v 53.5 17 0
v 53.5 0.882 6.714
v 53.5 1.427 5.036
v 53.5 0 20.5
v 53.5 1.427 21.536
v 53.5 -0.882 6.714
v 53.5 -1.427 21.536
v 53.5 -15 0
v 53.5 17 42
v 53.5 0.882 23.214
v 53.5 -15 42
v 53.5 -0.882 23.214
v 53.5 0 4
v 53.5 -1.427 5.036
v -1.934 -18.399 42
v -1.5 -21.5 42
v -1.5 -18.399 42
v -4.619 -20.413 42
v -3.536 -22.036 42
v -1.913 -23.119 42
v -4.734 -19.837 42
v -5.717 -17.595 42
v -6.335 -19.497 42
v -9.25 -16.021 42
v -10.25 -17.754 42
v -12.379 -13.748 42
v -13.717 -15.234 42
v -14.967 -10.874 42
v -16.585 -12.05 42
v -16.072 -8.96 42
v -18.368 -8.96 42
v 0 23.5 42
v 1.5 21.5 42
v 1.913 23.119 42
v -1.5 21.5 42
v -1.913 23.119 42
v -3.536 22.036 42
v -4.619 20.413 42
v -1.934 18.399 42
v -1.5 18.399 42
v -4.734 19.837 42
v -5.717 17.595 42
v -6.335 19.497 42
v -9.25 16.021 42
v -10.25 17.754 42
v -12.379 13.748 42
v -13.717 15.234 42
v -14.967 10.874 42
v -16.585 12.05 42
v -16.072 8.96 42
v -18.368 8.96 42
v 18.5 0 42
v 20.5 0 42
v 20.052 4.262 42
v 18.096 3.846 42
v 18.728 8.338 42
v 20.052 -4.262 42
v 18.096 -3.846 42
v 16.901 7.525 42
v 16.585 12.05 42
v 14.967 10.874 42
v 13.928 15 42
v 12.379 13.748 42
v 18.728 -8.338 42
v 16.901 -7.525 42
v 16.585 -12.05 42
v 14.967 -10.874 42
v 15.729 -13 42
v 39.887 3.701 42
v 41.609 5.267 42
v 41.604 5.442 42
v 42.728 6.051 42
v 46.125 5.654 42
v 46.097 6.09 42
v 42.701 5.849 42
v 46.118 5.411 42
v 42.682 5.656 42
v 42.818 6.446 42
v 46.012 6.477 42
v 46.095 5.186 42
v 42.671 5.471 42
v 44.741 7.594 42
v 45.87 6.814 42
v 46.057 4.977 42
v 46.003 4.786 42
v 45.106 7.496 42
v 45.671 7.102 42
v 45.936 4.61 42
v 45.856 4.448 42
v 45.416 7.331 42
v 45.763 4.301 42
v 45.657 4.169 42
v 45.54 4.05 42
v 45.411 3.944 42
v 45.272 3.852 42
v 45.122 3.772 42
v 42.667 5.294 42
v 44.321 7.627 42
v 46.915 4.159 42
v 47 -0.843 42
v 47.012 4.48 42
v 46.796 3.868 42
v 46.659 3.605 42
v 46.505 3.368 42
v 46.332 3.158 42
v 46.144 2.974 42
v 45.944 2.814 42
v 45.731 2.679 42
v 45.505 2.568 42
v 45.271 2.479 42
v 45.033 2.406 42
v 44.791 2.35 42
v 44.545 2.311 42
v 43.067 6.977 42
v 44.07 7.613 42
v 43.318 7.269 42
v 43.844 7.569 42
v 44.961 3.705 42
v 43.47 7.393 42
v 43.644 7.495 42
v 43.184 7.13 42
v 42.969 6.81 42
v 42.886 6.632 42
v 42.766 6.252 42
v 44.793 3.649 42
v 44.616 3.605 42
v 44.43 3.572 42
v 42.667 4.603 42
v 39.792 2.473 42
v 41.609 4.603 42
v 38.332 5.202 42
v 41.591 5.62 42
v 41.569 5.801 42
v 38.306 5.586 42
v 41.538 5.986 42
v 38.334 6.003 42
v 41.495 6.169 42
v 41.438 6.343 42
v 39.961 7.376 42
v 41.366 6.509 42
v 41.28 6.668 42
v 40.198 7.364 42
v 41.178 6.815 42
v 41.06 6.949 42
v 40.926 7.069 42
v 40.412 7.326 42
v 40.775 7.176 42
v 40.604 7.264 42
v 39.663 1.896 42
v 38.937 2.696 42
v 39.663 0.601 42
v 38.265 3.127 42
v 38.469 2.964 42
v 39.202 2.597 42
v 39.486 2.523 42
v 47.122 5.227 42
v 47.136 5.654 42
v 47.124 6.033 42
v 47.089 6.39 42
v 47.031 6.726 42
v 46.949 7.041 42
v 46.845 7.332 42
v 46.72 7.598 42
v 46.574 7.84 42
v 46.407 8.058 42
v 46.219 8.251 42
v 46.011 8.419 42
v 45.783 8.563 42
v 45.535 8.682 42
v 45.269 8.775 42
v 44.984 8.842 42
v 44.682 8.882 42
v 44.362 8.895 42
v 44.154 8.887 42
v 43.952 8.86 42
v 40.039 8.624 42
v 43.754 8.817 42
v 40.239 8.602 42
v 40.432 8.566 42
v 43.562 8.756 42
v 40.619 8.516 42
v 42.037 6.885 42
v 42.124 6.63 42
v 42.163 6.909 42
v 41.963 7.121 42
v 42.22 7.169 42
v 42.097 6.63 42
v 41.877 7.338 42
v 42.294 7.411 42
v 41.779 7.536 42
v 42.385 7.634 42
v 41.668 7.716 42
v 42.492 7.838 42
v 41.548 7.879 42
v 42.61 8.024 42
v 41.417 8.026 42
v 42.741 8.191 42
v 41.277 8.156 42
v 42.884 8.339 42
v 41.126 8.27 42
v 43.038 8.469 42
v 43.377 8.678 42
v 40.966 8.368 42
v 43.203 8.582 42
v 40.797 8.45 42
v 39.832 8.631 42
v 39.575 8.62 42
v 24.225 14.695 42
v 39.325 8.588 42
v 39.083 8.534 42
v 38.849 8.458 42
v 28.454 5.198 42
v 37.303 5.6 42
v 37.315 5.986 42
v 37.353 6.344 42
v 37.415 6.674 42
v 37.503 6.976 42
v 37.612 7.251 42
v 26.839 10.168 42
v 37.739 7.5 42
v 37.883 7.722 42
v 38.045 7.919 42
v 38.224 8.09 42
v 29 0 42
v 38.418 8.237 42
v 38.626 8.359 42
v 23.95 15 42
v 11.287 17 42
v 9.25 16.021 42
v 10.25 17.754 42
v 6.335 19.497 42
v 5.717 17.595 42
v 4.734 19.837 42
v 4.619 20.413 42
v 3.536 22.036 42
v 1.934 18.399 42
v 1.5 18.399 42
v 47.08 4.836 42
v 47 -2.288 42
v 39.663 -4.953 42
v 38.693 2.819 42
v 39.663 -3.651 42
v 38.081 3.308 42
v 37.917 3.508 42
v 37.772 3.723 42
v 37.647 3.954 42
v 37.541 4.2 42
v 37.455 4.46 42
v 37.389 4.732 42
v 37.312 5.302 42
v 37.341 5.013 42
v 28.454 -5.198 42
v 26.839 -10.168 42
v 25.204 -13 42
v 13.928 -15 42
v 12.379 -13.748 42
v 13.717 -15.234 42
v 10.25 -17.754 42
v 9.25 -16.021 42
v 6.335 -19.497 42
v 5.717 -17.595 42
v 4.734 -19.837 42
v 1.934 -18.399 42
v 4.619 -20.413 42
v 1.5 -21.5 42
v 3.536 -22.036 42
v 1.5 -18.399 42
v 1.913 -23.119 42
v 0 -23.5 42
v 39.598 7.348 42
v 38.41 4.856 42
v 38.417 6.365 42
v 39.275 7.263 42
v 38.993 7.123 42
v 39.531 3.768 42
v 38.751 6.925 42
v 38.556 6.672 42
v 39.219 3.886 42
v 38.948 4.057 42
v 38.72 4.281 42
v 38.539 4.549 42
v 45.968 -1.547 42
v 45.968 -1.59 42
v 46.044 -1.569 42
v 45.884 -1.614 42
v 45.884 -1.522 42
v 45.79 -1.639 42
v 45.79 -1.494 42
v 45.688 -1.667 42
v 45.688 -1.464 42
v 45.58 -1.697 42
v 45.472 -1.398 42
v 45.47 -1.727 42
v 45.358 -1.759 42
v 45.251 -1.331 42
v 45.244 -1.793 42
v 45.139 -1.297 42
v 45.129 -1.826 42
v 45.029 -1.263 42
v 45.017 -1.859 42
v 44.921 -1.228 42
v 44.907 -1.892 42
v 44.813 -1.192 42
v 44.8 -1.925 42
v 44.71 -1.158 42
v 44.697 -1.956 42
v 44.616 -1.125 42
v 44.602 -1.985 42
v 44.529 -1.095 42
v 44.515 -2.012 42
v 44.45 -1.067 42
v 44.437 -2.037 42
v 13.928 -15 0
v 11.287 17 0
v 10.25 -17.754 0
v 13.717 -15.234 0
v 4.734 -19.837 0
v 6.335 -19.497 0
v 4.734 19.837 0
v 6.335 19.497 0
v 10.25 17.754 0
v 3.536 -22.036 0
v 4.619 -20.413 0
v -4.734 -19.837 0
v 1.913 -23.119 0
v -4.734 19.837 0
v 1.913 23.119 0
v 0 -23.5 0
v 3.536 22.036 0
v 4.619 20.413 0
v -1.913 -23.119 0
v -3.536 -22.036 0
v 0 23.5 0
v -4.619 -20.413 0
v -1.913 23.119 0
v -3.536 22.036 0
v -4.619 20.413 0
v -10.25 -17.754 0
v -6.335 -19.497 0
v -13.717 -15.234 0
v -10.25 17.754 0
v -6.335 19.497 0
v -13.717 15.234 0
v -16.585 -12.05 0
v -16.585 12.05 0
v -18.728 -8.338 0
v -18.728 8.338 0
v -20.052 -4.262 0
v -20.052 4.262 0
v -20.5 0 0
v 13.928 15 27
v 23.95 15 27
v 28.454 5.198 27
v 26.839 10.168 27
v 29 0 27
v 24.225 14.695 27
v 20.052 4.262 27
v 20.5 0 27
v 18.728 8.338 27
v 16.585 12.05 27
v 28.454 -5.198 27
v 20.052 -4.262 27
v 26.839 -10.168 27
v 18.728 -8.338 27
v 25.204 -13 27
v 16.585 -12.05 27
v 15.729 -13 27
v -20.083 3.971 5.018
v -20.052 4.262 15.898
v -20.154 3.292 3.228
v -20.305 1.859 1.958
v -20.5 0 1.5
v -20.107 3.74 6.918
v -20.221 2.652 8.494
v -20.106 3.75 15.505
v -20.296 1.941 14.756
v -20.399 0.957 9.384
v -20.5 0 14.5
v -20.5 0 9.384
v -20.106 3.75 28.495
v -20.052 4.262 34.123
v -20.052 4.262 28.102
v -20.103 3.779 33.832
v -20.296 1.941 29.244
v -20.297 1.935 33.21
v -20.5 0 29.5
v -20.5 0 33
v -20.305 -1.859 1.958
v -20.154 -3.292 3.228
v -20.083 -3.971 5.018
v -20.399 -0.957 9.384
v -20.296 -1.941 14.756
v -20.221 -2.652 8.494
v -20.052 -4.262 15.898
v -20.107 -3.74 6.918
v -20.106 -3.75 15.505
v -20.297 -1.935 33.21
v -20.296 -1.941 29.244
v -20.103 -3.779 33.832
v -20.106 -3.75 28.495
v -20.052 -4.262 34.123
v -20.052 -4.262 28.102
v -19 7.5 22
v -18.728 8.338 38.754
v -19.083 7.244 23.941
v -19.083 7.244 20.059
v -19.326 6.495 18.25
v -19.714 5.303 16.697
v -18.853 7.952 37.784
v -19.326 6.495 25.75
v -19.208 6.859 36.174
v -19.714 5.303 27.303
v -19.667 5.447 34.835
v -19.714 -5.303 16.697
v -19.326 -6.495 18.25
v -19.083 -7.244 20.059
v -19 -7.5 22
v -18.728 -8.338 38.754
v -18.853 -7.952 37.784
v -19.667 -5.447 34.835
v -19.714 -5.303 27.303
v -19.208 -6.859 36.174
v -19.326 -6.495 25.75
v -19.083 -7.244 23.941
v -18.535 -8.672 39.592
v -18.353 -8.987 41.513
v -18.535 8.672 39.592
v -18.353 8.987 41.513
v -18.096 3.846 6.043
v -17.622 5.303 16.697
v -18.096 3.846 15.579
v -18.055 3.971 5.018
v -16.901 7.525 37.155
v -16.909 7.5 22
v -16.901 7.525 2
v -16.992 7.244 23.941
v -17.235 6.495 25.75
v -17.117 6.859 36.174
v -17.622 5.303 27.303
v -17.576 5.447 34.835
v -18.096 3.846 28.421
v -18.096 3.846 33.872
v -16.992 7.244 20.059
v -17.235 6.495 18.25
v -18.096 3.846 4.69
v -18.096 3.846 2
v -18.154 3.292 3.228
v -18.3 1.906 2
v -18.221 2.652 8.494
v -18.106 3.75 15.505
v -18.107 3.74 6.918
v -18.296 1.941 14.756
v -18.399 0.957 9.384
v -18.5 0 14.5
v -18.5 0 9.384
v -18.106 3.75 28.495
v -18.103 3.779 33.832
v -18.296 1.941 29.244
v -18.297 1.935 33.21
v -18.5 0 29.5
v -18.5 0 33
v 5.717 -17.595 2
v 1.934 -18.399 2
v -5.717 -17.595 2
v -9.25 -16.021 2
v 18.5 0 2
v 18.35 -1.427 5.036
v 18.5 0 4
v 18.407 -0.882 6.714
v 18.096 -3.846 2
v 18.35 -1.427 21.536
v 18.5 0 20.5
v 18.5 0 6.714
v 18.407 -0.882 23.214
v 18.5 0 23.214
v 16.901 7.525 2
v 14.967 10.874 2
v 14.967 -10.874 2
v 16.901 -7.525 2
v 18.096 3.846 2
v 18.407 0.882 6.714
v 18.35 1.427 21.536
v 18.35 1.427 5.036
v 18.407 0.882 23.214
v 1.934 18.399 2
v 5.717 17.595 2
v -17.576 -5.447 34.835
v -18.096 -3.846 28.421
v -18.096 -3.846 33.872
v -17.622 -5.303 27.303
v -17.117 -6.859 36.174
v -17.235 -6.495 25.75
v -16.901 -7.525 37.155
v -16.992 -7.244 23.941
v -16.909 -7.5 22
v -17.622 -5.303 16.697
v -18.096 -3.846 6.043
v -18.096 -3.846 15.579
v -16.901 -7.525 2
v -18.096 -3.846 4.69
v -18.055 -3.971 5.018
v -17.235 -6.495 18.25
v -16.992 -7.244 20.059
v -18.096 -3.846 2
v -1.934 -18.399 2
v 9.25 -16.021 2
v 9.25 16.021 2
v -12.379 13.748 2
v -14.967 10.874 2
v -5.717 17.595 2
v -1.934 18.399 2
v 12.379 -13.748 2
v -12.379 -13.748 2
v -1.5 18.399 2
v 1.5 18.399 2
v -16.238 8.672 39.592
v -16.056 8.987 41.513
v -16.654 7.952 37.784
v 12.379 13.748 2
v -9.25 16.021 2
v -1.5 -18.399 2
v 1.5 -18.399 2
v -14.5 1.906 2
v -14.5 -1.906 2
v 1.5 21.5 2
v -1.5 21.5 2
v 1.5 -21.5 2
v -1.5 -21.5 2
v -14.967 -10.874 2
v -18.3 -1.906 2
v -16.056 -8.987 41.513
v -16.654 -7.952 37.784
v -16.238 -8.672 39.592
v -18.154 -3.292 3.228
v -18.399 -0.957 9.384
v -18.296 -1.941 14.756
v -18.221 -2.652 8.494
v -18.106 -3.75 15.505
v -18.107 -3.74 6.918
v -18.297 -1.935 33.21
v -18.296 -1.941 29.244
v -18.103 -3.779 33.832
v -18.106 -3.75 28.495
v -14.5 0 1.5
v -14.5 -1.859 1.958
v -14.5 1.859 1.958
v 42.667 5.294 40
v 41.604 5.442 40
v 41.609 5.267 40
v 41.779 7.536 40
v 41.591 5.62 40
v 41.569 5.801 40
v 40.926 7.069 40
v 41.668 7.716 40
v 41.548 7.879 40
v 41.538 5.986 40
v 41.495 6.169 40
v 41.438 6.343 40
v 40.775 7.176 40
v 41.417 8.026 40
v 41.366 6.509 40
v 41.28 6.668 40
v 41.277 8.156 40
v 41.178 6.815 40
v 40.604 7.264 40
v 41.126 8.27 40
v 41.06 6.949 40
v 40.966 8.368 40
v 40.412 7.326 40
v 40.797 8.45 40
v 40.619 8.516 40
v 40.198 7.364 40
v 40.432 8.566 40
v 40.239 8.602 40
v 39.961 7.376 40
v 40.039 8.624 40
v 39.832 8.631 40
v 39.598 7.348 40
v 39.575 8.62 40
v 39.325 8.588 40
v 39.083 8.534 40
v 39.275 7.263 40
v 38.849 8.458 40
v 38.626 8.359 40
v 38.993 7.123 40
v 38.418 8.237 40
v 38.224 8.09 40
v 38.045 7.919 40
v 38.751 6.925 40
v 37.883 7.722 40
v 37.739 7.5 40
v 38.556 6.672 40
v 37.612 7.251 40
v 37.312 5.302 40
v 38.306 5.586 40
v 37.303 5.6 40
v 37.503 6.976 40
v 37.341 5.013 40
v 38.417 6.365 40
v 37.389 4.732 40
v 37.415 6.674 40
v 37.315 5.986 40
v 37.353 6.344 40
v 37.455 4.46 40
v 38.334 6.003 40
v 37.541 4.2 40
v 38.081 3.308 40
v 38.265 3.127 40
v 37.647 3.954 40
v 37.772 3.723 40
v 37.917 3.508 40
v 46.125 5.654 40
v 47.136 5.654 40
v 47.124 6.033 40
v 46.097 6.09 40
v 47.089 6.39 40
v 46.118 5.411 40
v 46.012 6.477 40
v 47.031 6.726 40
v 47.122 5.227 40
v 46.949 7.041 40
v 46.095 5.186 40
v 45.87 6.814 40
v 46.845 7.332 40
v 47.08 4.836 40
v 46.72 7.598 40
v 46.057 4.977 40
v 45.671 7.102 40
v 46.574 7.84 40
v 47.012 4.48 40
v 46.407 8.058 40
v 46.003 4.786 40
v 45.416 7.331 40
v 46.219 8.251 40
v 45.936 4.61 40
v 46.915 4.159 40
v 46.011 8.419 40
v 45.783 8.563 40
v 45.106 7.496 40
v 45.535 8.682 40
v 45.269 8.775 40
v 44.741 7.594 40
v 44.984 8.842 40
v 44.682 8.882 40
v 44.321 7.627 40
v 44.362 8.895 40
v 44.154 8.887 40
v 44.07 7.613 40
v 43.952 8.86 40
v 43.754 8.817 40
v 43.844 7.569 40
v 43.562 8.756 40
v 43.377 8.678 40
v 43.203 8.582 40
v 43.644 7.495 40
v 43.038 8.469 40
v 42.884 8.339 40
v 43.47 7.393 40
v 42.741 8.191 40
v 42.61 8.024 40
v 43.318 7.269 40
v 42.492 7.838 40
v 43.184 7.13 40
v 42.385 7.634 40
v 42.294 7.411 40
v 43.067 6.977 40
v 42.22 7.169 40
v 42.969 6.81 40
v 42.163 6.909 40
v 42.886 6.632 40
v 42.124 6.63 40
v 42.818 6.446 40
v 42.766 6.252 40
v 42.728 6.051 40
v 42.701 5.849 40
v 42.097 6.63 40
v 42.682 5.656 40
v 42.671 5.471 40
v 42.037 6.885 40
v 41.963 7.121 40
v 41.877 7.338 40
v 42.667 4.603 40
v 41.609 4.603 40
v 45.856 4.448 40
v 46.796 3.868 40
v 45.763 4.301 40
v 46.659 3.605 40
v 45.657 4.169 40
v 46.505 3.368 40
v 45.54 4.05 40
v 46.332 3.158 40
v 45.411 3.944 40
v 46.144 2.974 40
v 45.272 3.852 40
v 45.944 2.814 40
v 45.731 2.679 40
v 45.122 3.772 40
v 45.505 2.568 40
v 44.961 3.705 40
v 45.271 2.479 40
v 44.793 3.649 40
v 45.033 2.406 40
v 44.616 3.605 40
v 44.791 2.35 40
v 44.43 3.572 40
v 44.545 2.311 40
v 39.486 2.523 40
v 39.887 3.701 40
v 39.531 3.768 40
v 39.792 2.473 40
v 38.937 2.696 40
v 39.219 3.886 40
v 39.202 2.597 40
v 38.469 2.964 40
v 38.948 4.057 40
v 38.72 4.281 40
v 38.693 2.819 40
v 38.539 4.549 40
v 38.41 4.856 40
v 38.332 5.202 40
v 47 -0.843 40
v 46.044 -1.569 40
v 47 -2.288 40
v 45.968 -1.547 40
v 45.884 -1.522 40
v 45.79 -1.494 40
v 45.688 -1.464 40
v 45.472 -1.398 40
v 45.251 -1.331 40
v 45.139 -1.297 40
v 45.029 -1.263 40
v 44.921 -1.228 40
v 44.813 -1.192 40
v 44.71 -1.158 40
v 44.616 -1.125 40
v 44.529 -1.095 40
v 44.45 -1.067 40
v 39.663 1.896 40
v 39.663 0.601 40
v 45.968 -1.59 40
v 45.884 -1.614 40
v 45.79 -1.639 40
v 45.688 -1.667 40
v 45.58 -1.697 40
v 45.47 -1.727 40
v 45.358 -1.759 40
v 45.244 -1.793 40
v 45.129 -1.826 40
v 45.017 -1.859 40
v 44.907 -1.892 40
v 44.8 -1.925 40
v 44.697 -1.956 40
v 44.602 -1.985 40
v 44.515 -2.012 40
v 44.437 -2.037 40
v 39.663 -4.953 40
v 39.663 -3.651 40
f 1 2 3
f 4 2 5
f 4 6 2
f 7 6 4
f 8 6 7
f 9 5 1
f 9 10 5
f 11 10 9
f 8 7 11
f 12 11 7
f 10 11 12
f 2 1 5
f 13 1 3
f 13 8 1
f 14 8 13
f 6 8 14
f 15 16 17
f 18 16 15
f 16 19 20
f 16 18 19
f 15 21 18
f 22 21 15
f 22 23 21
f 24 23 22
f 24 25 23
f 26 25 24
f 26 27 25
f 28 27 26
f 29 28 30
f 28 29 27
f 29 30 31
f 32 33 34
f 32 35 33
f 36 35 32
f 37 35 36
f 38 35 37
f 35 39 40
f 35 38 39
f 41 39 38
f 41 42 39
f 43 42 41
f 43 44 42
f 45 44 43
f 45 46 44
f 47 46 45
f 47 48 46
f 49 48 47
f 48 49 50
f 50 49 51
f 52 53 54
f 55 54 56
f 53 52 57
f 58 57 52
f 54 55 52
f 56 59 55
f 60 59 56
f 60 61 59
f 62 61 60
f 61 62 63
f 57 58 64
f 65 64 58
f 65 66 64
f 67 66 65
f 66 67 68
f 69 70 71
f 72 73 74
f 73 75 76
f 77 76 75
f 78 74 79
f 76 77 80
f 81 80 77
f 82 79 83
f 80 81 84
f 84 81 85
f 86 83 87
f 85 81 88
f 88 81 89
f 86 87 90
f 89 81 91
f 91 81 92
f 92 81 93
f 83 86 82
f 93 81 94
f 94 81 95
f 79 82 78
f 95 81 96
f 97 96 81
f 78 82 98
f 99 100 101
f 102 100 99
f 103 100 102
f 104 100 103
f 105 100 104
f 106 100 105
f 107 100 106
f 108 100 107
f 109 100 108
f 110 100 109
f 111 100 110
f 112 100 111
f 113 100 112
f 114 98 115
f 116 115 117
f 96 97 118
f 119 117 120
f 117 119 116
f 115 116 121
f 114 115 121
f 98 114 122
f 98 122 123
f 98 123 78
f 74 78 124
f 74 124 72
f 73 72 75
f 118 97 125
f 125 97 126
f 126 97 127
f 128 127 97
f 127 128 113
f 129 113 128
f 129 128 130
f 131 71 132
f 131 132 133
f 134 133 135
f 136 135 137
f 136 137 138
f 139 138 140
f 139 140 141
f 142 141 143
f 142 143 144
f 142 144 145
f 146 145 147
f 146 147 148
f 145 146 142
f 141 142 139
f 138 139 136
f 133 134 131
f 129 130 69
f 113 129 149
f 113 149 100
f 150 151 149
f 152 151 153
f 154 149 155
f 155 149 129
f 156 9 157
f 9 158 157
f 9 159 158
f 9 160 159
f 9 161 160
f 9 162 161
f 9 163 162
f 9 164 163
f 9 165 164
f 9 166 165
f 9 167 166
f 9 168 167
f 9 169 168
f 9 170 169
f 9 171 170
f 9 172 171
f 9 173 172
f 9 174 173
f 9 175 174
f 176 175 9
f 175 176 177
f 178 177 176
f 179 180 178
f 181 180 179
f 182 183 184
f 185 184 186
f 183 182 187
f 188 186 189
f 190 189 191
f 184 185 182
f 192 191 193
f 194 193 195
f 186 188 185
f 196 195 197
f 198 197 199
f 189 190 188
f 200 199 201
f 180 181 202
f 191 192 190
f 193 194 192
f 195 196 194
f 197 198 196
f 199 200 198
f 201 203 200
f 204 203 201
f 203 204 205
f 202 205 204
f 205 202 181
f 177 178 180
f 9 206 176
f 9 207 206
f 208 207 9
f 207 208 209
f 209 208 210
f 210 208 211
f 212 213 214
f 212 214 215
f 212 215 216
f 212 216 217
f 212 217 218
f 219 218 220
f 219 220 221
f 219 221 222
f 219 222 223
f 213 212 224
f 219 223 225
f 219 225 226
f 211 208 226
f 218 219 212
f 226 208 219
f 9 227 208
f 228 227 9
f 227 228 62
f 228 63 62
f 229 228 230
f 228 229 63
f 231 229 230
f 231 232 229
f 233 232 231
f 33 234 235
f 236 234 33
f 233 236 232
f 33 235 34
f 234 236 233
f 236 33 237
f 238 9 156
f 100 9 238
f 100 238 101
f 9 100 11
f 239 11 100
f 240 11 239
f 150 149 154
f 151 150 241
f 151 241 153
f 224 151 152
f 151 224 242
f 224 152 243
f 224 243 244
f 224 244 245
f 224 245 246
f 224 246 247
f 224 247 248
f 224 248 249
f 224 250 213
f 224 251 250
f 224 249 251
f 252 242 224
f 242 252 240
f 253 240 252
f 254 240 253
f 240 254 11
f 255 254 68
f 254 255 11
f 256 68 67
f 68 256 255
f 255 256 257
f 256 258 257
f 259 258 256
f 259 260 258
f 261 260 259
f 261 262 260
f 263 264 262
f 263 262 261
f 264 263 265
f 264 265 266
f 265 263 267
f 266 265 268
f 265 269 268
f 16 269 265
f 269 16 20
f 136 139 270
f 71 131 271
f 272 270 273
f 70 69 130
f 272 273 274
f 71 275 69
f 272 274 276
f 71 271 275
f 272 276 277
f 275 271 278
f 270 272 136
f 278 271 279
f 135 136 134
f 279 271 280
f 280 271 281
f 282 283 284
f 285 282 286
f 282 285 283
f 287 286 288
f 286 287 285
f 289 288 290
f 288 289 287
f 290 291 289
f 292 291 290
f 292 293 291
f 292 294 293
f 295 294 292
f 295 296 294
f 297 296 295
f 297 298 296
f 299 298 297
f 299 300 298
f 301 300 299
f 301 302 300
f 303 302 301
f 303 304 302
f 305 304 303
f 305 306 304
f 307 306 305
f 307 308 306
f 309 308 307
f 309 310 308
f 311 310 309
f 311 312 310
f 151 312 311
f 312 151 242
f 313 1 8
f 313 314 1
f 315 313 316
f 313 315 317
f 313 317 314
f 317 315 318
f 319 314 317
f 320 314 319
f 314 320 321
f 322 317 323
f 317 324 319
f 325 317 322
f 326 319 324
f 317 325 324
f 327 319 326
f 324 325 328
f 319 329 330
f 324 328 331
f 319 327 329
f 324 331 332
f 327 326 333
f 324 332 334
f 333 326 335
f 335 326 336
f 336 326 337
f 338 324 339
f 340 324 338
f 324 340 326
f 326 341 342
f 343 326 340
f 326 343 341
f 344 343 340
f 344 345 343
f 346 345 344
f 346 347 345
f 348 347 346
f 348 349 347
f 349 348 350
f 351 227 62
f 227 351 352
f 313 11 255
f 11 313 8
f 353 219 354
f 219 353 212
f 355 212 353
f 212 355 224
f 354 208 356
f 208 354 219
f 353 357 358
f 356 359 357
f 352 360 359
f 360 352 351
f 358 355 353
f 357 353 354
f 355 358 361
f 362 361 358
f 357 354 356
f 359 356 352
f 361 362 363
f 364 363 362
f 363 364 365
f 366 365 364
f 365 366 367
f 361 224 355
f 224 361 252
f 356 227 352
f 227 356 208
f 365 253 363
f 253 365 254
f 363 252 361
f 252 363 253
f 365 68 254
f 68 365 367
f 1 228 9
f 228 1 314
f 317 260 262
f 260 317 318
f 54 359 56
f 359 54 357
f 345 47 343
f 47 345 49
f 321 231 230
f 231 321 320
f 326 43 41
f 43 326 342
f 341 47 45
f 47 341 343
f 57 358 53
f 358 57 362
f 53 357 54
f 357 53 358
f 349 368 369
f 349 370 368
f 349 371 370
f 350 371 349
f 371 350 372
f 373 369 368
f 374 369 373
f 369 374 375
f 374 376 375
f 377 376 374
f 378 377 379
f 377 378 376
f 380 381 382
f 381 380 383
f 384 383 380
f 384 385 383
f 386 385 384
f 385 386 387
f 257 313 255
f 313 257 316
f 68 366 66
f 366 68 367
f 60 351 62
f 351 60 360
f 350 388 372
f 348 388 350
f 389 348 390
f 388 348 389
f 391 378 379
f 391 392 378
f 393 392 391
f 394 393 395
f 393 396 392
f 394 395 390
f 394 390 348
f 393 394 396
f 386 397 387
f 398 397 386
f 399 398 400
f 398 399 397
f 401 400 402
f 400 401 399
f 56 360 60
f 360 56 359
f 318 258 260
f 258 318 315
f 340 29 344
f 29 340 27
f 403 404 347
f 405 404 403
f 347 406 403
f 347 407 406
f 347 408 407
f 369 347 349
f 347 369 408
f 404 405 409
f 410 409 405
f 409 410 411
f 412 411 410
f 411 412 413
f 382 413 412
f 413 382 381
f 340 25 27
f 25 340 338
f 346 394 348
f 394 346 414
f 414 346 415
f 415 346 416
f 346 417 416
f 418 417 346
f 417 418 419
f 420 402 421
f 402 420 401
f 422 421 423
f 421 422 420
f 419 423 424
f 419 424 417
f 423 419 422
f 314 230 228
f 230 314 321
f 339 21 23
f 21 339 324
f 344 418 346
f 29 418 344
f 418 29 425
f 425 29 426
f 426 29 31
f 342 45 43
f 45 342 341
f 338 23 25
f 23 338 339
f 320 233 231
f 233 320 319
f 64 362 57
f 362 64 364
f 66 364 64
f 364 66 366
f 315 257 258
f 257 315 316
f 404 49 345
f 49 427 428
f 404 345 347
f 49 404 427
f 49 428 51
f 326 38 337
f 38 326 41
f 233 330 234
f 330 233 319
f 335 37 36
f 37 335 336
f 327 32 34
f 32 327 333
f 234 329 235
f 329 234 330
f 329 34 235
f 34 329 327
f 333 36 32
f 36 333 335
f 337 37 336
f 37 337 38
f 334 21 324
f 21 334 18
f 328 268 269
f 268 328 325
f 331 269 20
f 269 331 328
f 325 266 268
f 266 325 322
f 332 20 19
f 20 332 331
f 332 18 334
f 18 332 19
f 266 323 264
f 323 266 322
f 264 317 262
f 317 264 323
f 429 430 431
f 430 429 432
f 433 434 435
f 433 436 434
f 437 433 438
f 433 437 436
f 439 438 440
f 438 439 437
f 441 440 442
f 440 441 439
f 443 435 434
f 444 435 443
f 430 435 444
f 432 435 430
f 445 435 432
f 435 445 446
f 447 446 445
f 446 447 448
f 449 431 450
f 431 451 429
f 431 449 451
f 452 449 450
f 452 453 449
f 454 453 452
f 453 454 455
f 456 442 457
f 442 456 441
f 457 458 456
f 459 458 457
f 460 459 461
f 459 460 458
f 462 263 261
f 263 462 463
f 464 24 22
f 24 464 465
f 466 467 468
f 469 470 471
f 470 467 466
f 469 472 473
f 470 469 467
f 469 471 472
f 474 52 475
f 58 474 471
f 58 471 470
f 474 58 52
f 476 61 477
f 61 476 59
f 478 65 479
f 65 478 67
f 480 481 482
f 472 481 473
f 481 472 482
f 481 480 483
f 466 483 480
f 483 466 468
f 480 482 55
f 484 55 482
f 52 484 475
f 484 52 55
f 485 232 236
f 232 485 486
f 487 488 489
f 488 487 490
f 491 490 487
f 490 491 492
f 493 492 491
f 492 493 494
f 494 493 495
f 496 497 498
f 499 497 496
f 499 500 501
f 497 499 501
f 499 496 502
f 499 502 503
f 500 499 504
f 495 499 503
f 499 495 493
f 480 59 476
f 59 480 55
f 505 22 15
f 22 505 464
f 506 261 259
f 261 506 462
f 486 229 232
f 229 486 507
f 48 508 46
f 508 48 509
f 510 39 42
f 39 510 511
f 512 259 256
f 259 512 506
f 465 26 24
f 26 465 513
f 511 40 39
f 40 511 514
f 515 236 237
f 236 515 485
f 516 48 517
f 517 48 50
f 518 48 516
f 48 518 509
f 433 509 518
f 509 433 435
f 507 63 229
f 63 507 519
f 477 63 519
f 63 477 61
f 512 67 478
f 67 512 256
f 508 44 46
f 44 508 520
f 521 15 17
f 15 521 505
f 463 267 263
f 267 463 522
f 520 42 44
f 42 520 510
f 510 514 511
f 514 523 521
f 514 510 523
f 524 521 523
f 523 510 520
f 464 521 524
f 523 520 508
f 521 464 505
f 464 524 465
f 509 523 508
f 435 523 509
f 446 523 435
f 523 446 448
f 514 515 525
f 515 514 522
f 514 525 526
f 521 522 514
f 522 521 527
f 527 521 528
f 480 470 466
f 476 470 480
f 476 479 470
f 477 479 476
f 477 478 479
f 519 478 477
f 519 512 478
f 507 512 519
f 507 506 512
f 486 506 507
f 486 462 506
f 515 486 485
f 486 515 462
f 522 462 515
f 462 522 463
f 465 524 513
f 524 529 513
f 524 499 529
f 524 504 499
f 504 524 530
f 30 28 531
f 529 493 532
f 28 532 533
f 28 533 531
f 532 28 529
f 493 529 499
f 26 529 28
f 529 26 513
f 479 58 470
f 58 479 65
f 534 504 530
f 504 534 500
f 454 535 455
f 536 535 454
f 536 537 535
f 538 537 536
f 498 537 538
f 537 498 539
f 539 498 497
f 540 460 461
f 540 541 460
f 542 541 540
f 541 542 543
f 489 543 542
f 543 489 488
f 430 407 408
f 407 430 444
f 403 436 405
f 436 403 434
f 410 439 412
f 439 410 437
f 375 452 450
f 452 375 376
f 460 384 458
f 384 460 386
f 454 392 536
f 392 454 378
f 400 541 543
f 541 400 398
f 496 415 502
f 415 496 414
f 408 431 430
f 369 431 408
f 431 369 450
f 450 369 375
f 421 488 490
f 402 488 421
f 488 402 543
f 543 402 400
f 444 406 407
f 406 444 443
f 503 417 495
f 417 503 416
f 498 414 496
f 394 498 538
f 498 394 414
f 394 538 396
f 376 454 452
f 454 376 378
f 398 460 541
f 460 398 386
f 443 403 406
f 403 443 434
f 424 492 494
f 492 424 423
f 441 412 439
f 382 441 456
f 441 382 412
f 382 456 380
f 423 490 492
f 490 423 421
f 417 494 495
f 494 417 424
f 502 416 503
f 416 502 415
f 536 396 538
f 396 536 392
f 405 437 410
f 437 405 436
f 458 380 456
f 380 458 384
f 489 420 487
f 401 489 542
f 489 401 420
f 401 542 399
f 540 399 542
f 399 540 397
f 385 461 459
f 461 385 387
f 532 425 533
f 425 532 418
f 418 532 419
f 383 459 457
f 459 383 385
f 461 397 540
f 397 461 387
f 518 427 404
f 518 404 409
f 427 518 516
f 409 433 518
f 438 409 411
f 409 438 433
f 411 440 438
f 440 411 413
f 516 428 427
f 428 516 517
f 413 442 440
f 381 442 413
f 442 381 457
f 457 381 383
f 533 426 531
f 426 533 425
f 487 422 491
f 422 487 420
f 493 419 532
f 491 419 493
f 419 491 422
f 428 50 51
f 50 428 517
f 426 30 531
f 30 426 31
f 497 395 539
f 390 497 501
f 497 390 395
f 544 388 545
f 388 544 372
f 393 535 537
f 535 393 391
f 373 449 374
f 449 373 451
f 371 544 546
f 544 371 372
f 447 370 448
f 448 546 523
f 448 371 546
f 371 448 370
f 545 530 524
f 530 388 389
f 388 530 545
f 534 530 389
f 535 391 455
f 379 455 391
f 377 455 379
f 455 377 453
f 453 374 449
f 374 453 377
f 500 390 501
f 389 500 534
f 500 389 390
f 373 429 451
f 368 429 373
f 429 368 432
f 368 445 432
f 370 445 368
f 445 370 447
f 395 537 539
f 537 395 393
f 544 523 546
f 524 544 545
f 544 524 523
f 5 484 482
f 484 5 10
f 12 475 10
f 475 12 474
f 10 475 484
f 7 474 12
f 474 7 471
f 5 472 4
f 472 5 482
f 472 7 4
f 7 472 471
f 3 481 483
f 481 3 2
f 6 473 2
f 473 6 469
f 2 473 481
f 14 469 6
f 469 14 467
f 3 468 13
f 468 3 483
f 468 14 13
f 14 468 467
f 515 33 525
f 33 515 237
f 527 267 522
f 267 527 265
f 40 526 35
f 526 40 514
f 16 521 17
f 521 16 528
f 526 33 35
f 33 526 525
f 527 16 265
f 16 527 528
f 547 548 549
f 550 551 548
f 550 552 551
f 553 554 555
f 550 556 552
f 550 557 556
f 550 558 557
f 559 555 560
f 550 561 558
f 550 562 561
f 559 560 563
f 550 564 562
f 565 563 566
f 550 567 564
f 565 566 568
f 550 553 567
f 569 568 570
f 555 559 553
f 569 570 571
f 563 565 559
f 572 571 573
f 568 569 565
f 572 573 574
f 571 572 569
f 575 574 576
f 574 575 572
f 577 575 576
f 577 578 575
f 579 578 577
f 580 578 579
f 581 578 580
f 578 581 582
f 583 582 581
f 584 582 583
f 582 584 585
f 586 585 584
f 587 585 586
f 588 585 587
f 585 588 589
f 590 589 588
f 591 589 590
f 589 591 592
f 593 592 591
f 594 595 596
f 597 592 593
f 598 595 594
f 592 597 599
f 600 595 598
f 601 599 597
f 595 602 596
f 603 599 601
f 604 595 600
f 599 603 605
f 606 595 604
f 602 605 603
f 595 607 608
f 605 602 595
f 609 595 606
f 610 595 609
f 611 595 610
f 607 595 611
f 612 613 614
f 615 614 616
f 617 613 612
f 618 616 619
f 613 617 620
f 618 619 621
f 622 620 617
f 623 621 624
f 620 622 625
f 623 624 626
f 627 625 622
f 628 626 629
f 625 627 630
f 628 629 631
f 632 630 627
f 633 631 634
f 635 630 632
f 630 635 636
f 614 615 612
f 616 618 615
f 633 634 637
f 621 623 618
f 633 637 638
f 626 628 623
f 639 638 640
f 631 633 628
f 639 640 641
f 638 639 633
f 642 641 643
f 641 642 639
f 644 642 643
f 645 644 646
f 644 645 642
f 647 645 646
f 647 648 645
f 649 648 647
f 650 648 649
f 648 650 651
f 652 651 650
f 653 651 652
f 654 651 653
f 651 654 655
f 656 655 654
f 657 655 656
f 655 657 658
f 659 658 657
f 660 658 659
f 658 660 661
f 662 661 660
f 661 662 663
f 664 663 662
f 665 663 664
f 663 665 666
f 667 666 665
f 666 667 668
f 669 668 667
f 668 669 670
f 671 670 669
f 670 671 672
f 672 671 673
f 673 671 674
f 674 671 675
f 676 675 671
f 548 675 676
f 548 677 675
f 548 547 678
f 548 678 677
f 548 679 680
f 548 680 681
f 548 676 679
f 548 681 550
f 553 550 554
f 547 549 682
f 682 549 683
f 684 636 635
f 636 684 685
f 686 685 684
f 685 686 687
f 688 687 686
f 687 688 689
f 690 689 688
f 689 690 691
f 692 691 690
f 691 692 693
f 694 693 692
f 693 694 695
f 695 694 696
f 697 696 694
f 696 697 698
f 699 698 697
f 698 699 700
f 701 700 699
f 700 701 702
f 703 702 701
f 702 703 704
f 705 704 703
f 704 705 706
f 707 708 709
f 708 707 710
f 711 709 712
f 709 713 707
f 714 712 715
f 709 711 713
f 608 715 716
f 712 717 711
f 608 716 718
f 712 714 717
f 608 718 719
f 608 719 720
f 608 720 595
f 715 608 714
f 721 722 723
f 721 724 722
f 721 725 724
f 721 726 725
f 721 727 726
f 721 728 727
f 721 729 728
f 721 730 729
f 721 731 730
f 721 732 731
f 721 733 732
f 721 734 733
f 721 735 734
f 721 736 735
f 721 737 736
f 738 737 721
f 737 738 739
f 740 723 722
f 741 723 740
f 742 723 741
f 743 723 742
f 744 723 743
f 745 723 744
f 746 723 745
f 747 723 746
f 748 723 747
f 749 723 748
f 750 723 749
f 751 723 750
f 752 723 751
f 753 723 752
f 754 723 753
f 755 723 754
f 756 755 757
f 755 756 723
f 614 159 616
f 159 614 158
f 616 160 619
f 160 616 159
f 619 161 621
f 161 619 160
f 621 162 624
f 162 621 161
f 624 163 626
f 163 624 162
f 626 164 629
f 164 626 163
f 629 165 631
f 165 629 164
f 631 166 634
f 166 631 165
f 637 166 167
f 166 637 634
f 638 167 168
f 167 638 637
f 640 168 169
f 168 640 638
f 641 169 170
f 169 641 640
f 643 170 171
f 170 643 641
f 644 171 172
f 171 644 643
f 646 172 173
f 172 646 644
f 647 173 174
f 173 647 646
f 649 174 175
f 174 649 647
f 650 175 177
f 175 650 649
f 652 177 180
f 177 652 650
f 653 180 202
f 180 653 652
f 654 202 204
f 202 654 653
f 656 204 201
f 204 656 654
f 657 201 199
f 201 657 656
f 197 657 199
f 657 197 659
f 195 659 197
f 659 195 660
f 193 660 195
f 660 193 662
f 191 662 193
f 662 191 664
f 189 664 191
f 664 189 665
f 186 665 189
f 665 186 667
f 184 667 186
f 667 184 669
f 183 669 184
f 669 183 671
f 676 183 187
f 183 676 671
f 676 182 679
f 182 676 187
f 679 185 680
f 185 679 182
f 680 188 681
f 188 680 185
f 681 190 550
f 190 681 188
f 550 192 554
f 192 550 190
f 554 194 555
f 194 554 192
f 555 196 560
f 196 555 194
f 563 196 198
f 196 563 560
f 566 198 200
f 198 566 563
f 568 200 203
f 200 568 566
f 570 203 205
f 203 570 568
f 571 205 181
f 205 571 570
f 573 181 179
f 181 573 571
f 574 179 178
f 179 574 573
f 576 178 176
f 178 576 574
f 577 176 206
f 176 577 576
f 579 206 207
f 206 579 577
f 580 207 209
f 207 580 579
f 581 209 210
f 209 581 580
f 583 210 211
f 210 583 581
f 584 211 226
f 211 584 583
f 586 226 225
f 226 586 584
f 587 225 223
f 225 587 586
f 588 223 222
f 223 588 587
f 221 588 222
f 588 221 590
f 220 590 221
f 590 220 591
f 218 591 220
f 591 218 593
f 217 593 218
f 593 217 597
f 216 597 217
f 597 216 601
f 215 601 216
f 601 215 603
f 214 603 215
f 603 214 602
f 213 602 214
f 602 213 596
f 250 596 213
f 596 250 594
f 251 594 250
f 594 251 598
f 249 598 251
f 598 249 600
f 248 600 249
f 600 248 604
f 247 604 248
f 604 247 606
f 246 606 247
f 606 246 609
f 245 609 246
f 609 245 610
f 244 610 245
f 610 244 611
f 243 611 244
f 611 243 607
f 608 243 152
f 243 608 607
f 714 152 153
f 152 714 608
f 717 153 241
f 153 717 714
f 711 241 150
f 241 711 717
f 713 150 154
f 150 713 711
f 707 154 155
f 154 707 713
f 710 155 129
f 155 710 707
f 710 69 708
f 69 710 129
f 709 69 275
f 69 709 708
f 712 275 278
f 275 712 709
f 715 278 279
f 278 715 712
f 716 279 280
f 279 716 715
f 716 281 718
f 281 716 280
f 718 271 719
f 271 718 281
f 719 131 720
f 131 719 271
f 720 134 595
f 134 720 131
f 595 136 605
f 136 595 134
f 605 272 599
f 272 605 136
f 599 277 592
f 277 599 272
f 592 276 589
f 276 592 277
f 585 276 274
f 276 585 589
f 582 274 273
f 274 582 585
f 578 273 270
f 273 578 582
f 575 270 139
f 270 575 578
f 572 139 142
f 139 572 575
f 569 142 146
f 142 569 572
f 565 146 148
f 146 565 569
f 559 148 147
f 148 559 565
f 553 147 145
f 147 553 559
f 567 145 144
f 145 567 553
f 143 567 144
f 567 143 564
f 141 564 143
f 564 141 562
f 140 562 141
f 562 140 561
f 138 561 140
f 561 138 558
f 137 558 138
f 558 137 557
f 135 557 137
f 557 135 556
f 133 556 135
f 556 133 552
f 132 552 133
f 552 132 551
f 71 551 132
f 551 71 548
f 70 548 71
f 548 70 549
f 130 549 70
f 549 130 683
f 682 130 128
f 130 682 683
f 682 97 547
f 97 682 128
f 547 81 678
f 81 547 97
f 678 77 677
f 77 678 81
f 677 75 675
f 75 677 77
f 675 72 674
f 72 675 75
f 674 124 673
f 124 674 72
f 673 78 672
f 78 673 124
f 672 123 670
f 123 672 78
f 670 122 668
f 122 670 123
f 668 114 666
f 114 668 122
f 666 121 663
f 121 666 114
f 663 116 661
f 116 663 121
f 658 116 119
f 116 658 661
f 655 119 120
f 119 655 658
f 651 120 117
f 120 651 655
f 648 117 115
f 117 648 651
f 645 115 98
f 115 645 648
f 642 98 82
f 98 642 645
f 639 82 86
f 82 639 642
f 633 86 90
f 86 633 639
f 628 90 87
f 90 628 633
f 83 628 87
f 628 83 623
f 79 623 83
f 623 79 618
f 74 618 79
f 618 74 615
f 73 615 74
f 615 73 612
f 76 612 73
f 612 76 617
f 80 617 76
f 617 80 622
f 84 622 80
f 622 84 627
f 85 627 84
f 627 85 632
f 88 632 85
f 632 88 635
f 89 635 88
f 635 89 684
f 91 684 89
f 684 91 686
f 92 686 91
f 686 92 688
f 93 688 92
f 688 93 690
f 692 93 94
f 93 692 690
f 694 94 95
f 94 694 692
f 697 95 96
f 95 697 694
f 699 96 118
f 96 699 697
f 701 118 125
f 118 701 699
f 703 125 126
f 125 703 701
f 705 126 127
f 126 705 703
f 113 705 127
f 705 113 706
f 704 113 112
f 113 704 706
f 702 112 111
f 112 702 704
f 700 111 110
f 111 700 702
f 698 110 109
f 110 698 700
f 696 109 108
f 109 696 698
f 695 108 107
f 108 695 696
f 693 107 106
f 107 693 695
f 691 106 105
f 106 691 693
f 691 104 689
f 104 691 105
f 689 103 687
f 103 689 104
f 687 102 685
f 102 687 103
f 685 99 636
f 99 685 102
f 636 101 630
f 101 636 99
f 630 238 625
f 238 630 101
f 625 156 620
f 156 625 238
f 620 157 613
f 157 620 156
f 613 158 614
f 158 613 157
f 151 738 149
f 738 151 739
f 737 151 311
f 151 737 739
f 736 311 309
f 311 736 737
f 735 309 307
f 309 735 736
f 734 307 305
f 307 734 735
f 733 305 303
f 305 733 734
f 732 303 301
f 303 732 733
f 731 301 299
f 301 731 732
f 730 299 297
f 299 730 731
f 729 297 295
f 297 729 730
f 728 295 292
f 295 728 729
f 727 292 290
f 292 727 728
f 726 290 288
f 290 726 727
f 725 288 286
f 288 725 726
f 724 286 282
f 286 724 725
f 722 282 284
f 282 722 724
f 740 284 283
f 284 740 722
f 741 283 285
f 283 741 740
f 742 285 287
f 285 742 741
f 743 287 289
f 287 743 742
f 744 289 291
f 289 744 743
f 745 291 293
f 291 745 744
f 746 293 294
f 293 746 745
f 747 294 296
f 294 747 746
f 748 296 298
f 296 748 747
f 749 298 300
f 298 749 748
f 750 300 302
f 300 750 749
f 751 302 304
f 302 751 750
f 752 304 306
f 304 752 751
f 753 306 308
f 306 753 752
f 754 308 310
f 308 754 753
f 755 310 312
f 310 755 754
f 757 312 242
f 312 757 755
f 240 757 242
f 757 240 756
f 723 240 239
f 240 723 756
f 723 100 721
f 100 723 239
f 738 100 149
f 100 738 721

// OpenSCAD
// 35mm measured - make teh hole 1mm bigger so it isn't too tight
diameter=37;
radius=(diameter/2);
// 37 mm measured
tall=40;
// 2 x 2 mm measured
notch = 3;

// direct drive connector
// 27mm wide x 15mm deep
ddwidth=17;
dddepth=15;
//13mm diam measured 
ddholeradius=7.5;
ddholefromtop=20;
// wall thickness
thick=2;

// how far offset from all
extension=35;
//how thick bracket should be
extensionwidth=30;
  versionlabel = "v3";
  screwholeradius=1.5;
  
module outline() {
maincylinder();
    
extension();

translate (v=[0 , radius, 0])  cylinder(tall+thick, notch + thick,notch + thick);
translate (v=[0 ,-radius , 0])  cylinder(tall+thick, notch + thick,notch + thick);;
}


module maincylinder() {
    cylinder(h=(tall + thick),r=(radius + thick));
}
module extension(){
    
       difference(){ 
      translate (v=[0, -(extensionwidth/2), 0]) cube(size=[extension+radius, extensionwidth , tall + thick]);
    translate(v=[2*thick,0, (tall+ thick  - dddepth)]) rotate(0, 0, 90) cylinder(dddepth, 25 , 25 );

   }
   
   // add back side walls
   translate (v=[0, -(extensionwidth/2), 0]) cube(size=[extension+radius, thick , tall + thick]);
   translate (v=[0, (extensionwidth/2), 0]) cube(size=[extension+radius, thick , tall + thick]);
   

}

module space(){
// central hole
    translate(v=[-0, -0, thick]) cylinder(h=tall,r=radius);
// direct drive hole
  //  translate(v=[ddwidth - thick, -2* thick -(ddwidth/2), (tall+ thick  - dddepth)]) cube(size=[ddwidth + thick, ddwidth + 4* thick, dddepth]);

    // connector hole
    translate (v=[-(diameter/2 + thick), 0, tall +thick - ddholefromtop])  rotate(a=[0, 90, 0])   cylinder(h=thick * 3,r=ddholeradius);
    //button notch
        translate (v=[-(diameter/2 + thick), 0, tall +thick ])
      rotate(a=[0, 90, 0])  
        cylinder(h=thick * 3,r=9);
    //bottom screw hole access
        translate (v=[-(diameter/2 + thick), 0, thick * 2 + screwholeradius ])
      rotate(a=[0, 90, 0])  
        cylinder(h=thick * 3,r=4);
    
    // screw hole
    
    translate (v=[-(diameter - thick), 0, tall +thick - ddholefromtop])
      rotate(a=[0, 90, 0])  
        cylinder(h=500,r=screwholeradius);
    translate (v=[-(diameter - thick), 0, screwholeradius  +  2* thick])
      rotate(a=[0, 90, 0])  
        cylinder(h=500,r=screwholeradius);
   


    //slot
    translate(v=[-(notch/2), -(radius + notch) , thick]) 
    cube(size=[notch, (diameter + 2 * notch), tall]);
     // version label
   font = "Liberation Sans";

translate ([diameter+10,-5,tall ])  {
   linear_extrude(height = 2) {
      rotate (90, 0 , 0) text(versionlabel, font = font, size = 10);
     }
 }

}
difference(){ 
  outline();
    space();
}
